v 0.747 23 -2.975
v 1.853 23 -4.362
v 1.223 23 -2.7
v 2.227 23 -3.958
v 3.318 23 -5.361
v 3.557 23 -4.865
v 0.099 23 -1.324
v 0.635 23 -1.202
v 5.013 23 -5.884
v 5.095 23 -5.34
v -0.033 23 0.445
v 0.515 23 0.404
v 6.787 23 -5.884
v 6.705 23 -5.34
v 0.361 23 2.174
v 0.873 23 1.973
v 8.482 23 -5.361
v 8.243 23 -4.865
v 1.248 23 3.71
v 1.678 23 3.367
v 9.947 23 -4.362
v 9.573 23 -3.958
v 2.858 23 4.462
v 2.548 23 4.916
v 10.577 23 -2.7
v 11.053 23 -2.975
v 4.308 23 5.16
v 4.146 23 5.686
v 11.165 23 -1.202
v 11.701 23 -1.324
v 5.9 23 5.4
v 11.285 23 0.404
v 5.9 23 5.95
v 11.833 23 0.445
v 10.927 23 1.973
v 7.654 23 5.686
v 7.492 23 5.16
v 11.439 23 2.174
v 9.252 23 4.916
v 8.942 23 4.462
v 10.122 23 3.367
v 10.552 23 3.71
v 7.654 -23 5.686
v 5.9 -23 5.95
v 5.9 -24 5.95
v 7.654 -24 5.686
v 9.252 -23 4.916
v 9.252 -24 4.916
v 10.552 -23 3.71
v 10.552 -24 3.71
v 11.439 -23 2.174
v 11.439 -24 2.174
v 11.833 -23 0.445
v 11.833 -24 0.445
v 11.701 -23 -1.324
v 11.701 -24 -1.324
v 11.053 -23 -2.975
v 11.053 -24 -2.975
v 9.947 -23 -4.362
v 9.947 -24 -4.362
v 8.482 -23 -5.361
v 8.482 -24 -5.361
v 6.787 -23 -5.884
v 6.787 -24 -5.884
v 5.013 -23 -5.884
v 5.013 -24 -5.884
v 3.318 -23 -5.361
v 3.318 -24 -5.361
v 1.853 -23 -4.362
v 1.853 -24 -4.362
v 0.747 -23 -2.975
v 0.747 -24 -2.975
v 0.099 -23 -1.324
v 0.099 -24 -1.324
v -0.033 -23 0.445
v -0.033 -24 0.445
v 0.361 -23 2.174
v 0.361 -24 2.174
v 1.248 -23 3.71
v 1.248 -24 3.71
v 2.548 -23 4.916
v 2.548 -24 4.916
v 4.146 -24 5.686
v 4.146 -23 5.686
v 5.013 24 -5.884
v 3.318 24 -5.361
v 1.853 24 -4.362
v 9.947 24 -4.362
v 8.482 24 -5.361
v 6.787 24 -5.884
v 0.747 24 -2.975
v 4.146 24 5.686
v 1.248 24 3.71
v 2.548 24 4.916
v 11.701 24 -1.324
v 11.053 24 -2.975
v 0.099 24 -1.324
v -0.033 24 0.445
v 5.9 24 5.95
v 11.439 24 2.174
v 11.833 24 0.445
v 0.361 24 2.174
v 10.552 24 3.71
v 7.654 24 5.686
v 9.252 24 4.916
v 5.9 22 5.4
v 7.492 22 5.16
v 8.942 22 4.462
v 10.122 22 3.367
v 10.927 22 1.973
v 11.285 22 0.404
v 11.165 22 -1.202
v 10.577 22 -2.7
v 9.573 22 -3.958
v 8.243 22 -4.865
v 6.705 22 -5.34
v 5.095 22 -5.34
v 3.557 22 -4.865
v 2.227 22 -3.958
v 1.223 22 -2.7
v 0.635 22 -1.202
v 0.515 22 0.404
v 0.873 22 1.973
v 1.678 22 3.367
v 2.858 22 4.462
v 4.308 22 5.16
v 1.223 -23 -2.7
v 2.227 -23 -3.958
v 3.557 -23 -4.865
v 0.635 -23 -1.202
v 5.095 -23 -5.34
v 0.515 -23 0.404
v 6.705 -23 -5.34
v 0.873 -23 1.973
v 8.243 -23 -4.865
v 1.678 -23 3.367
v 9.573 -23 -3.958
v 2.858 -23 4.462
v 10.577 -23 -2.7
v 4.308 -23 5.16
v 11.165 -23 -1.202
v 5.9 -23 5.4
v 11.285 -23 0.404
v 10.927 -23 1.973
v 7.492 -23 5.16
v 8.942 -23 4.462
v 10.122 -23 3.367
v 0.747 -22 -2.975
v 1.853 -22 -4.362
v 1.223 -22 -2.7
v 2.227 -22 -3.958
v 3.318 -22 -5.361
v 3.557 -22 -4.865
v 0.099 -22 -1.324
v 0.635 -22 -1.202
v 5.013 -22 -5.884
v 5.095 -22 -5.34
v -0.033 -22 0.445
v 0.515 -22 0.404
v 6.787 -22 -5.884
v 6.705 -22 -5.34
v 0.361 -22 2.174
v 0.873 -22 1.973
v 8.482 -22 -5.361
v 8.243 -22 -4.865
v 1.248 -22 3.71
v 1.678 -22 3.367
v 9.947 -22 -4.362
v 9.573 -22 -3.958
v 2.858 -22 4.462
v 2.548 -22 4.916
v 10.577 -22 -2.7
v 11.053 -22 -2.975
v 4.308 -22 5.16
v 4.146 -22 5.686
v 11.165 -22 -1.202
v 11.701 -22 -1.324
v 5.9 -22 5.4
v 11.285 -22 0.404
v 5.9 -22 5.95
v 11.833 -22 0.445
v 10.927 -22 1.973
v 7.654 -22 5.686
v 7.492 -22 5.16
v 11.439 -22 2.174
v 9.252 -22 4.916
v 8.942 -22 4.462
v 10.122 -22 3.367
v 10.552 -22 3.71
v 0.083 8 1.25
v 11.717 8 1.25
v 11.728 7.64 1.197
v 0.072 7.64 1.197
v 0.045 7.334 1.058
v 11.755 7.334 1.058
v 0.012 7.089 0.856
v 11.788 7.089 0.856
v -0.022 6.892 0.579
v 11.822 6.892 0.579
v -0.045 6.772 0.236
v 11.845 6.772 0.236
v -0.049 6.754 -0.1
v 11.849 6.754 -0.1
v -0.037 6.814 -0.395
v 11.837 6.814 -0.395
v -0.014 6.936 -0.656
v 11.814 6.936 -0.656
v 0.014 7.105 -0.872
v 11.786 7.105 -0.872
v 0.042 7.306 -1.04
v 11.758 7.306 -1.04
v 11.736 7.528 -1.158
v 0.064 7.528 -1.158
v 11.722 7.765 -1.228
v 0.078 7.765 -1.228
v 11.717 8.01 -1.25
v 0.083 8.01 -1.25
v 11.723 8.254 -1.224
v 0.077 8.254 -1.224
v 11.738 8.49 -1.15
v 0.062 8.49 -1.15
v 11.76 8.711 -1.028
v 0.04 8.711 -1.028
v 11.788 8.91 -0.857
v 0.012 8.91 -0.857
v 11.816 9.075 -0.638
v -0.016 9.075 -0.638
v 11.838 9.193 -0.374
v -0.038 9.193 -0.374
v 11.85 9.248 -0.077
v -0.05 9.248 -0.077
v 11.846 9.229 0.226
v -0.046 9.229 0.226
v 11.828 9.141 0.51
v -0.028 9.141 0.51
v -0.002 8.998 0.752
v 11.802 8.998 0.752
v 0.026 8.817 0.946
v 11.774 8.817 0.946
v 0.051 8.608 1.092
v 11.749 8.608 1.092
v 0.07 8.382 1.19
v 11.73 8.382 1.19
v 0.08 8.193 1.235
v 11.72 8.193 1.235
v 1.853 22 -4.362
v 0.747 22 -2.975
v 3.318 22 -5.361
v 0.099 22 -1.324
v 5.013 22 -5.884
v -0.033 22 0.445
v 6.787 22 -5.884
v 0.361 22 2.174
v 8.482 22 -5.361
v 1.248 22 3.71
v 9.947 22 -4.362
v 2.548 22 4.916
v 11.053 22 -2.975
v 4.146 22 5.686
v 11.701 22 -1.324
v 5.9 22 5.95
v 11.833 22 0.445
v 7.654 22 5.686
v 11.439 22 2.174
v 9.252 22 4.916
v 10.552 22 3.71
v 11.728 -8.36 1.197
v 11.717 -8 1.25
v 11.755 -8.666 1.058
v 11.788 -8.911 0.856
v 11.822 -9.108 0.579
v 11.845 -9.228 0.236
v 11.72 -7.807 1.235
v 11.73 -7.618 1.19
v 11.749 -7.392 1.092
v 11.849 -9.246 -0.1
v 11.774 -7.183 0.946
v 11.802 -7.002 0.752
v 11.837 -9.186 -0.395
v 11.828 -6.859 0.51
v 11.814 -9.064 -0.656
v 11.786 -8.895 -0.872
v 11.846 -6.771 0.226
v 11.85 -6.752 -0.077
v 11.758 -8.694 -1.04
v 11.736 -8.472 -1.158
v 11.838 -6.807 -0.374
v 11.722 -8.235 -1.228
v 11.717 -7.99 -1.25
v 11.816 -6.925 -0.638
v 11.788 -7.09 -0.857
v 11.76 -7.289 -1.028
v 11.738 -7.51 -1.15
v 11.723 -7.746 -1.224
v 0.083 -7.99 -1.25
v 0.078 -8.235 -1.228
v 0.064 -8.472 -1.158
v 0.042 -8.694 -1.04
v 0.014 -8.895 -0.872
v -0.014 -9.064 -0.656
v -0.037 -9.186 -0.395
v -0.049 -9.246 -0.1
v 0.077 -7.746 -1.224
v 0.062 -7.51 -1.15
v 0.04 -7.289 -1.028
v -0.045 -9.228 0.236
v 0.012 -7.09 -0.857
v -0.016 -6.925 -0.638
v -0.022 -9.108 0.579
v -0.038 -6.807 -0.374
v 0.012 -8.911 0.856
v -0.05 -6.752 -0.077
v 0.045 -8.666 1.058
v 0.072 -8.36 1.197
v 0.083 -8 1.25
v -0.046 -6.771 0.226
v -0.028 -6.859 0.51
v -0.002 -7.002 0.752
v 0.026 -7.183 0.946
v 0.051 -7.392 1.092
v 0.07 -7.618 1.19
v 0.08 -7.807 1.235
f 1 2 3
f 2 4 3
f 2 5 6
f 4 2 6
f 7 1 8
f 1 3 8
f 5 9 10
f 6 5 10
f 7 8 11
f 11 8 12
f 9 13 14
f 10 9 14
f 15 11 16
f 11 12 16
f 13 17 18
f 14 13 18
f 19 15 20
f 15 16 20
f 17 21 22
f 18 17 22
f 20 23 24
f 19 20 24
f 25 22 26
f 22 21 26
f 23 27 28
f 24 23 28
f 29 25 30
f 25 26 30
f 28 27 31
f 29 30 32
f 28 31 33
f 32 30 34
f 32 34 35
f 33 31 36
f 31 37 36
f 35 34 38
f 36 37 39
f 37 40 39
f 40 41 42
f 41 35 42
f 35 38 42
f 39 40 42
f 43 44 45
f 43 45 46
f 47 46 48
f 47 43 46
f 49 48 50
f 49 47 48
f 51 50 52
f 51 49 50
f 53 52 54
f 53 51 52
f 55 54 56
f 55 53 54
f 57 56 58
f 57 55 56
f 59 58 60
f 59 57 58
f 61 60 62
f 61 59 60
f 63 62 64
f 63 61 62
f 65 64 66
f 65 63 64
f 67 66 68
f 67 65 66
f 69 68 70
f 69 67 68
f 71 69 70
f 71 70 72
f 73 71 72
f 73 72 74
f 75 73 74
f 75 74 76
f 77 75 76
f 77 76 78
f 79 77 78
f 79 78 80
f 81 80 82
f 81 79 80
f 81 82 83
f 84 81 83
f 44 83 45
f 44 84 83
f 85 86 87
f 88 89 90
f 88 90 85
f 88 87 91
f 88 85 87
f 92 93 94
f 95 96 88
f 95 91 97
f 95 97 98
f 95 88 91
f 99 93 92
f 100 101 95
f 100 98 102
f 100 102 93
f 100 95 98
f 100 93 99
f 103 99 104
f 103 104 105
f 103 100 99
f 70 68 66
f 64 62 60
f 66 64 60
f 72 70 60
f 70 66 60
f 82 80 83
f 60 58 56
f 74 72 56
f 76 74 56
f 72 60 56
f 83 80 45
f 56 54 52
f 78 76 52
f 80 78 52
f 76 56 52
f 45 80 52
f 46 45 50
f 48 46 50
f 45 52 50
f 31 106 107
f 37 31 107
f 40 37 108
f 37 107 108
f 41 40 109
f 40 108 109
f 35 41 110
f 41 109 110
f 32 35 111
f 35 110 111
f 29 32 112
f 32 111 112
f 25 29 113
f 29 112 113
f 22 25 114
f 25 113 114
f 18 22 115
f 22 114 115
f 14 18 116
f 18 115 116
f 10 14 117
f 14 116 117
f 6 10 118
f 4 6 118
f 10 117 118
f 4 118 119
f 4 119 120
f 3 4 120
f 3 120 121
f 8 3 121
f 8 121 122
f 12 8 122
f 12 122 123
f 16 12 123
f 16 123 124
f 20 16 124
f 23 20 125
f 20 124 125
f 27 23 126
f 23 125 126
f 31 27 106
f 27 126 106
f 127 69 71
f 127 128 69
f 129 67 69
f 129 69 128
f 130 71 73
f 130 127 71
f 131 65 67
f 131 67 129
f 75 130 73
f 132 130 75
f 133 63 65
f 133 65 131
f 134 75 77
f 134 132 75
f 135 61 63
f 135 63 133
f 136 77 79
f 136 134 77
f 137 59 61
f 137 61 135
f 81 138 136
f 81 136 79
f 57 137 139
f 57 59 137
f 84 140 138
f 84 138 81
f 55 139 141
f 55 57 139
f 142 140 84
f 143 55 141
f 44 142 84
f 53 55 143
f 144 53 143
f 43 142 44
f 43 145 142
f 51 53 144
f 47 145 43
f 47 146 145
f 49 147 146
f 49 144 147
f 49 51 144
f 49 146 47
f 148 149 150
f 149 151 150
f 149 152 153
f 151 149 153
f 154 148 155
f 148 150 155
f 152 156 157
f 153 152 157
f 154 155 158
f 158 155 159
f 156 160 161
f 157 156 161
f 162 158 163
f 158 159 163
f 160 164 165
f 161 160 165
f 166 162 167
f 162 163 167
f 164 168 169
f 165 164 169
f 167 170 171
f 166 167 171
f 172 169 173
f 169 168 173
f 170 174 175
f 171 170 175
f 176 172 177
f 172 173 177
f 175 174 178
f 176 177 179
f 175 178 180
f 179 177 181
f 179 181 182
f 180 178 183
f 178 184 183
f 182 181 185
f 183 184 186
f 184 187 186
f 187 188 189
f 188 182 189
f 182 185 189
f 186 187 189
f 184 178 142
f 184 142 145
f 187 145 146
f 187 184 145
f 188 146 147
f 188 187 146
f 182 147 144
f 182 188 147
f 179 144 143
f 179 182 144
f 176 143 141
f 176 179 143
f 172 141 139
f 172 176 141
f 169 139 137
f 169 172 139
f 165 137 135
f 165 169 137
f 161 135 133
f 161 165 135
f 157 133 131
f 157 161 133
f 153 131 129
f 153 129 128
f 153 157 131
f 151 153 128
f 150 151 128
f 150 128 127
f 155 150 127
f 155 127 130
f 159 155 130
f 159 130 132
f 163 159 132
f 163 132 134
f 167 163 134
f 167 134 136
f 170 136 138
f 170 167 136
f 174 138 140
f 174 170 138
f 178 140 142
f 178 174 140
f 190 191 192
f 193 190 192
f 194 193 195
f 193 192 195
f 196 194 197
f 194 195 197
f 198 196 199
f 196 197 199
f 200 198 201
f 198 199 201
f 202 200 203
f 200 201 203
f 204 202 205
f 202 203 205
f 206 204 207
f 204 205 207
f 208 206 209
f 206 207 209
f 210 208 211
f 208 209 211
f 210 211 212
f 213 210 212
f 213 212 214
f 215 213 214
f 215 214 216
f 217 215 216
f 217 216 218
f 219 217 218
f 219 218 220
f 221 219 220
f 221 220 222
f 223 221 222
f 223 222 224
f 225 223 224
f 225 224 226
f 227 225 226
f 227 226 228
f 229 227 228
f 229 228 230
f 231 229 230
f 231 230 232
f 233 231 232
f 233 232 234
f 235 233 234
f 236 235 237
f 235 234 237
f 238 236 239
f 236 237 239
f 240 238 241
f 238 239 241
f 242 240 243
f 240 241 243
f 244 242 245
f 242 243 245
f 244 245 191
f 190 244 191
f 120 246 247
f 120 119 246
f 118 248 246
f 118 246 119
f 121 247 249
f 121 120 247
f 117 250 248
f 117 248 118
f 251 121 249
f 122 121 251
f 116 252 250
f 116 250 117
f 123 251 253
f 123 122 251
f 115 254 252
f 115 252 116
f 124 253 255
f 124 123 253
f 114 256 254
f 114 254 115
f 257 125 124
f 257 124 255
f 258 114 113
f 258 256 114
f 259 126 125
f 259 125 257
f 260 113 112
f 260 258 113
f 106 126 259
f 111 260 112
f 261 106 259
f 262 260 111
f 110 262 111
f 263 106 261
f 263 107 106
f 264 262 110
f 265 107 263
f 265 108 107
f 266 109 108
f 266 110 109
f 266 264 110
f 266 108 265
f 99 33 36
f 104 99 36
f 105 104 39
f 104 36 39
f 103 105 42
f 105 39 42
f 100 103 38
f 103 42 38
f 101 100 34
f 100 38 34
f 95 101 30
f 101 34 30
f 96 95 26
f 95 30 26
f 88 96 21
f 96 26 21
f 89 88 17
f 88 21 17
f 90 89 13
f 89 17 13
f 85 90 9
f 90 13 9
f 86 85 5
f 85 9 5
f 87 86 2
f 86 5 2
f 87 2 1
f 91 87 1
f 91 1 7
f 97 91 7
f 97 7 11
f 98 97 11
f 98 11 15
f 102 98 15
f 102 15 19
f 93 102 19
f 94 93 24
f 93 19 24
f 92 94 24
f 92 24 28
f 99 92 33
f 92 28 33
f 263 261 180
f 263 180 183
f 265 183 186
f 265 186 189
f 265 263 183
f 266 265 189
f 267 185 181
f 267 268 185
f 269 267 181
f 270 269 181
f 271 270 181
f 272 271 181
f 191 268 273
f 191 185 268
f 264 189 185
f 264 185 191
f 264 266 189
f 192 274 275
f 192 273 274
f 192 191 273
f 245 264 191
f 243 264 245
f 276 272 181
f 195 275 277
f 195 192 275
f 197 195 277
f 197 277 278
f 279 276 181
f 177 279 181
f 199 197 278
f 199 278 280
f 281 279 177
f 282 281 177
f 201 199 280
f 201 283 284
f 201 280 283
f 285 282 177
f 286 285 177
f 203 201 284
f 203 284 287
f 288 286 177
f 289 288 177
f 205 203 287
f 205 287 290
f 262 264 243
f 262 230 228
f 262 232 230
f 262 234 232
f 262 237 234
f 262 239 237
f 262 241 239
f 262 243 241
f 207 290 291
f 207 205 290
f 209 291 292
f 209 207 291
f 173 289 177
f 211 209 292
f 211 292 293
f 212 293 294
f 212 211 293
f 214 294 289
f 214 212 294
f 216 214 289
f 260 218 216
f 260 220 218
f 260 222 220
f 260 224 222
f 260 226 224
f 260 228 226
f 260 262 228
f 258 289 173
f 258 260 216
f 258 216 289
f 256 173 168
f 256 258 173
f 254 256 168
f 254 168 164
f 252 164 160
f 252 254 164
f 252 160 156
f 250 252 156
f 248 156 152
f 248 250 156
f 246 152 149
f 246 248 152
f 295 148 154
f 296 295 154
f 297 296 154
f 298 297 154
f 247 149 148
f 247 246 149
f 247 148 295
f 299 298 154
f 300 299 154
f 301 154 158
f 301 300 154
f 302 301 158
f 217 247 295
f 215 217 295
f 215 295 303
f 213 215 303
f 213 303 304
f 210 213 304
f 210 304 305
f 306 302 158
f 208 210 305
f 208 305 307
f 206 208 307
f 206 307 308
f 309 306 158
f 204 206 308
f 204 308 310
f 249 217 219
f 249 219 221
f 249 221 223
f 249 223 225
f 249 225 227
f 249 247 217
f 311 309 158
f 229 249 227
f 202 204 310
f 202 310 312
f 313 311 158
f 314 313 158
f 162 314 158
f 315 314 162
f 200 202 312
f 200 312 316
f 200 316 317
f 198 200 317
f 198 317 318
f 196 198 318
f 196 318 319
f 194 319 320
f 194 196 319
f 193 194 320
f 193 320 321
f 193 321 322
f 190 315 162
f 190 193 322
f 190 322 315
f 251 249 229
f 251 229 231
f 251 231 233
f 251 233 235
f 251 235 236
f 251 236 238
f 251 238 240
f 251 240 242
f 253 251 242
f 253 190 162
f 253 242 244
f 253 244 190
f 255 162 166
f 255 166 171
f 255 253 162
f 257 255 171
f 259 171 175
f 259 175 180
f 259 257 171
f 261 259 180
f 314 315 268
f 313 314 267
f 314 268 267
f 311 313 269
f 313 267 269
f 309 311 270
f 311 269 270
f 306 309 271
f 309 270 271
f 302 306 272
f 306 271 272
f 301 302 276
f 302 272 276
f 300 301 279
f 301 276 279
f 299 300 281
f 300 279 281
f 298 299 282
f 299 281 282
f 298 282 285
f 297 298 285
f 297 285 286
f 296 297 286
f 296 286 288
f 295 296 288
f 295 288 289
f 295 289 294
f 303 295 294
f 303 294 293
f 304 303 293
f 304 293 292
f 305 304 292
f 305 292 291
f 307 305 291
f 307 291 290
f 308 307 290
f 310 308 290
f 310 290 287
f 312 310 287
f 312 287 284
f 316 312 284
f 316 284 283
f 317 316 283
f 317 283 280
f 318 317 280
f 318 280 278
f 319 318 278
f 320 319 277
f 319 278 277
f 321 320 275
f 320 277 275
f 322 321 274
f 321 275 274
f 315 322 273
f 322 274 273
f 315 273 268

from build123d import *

# Parameters (mm, degrees)
SKETCH_1_R         = 5.95
EXTRUDE_1_DEPTH    = 22
SKETCH_2_R         = 5.4
EXTRUDE_2_DEPTH    = 1
SKETCH_3_R         = 5.95
EXTRUDE_3_DEPTH    = 1
HOLE_WIZARD_M3_2_D = 2.5


with BuildPart() as part:
    # 草图1 → 凸台-拉伸1 (new body)
    with BuildSketch(Plane(origin=(0, 0, 0), x_dir=(1, 0, 0), z_dir=(0, 1, 0))):
        with Locations(Location((5.9, 0, 0), (0, 0, 270))):
            Circle(SKETCH_1_R)
    extrude_1 = extrude(amount=EXTRUDE_1_DEPTH)

    # 草图2 → 凸台-拉伸2 (add)
    with BuildSketch(Plane(origin=(0, 22, 0), x_dir=(1, 0, 0), z_dir=(0, 1, 0))):
        with Locations(Location((5.9, 0, 0), (0, 0, 270))):
            Circle(SKETCH_2_R)
    extrude_2 = extrude(amount=EXTRUDE_2_DEPTH)

    # 草图3 → 凸台-拉伸3 (add)
    with BuildSketch(Plane(origin=(0, 23, 0), x_dir=(1, 0, 0), z_dir=(0, 1, 0))):
        with Locations(Location((5.9, 0, 0), (0, 0, 270))):
            Circle(SKETCH_3_R)
    extrude_3 = extrude(amount=EXTRUDE_3_DEPTH)

    # 镜向10: 凸台-拉伸1, 凸台-拉伸2, 凸台-拉伸3 across plane
    add(extrude_1.mirror(Plane.ZX))
    add(extrude_2.mirror(Plane.ZX))
    add(extrude_3.mirror(Plane.ZX))

    # M3 螺纹孔2 (through all)
    with Locations(Plane(origin=(-0.05, -8, 0), x_dir=(0, 0, -1), z_dir=(-1, 0, 0))):
        with Locations((0, 0), (0, -16)):
            Hole(HOLE_WIZARD_M3_2_D / 2)


solid = part.part
